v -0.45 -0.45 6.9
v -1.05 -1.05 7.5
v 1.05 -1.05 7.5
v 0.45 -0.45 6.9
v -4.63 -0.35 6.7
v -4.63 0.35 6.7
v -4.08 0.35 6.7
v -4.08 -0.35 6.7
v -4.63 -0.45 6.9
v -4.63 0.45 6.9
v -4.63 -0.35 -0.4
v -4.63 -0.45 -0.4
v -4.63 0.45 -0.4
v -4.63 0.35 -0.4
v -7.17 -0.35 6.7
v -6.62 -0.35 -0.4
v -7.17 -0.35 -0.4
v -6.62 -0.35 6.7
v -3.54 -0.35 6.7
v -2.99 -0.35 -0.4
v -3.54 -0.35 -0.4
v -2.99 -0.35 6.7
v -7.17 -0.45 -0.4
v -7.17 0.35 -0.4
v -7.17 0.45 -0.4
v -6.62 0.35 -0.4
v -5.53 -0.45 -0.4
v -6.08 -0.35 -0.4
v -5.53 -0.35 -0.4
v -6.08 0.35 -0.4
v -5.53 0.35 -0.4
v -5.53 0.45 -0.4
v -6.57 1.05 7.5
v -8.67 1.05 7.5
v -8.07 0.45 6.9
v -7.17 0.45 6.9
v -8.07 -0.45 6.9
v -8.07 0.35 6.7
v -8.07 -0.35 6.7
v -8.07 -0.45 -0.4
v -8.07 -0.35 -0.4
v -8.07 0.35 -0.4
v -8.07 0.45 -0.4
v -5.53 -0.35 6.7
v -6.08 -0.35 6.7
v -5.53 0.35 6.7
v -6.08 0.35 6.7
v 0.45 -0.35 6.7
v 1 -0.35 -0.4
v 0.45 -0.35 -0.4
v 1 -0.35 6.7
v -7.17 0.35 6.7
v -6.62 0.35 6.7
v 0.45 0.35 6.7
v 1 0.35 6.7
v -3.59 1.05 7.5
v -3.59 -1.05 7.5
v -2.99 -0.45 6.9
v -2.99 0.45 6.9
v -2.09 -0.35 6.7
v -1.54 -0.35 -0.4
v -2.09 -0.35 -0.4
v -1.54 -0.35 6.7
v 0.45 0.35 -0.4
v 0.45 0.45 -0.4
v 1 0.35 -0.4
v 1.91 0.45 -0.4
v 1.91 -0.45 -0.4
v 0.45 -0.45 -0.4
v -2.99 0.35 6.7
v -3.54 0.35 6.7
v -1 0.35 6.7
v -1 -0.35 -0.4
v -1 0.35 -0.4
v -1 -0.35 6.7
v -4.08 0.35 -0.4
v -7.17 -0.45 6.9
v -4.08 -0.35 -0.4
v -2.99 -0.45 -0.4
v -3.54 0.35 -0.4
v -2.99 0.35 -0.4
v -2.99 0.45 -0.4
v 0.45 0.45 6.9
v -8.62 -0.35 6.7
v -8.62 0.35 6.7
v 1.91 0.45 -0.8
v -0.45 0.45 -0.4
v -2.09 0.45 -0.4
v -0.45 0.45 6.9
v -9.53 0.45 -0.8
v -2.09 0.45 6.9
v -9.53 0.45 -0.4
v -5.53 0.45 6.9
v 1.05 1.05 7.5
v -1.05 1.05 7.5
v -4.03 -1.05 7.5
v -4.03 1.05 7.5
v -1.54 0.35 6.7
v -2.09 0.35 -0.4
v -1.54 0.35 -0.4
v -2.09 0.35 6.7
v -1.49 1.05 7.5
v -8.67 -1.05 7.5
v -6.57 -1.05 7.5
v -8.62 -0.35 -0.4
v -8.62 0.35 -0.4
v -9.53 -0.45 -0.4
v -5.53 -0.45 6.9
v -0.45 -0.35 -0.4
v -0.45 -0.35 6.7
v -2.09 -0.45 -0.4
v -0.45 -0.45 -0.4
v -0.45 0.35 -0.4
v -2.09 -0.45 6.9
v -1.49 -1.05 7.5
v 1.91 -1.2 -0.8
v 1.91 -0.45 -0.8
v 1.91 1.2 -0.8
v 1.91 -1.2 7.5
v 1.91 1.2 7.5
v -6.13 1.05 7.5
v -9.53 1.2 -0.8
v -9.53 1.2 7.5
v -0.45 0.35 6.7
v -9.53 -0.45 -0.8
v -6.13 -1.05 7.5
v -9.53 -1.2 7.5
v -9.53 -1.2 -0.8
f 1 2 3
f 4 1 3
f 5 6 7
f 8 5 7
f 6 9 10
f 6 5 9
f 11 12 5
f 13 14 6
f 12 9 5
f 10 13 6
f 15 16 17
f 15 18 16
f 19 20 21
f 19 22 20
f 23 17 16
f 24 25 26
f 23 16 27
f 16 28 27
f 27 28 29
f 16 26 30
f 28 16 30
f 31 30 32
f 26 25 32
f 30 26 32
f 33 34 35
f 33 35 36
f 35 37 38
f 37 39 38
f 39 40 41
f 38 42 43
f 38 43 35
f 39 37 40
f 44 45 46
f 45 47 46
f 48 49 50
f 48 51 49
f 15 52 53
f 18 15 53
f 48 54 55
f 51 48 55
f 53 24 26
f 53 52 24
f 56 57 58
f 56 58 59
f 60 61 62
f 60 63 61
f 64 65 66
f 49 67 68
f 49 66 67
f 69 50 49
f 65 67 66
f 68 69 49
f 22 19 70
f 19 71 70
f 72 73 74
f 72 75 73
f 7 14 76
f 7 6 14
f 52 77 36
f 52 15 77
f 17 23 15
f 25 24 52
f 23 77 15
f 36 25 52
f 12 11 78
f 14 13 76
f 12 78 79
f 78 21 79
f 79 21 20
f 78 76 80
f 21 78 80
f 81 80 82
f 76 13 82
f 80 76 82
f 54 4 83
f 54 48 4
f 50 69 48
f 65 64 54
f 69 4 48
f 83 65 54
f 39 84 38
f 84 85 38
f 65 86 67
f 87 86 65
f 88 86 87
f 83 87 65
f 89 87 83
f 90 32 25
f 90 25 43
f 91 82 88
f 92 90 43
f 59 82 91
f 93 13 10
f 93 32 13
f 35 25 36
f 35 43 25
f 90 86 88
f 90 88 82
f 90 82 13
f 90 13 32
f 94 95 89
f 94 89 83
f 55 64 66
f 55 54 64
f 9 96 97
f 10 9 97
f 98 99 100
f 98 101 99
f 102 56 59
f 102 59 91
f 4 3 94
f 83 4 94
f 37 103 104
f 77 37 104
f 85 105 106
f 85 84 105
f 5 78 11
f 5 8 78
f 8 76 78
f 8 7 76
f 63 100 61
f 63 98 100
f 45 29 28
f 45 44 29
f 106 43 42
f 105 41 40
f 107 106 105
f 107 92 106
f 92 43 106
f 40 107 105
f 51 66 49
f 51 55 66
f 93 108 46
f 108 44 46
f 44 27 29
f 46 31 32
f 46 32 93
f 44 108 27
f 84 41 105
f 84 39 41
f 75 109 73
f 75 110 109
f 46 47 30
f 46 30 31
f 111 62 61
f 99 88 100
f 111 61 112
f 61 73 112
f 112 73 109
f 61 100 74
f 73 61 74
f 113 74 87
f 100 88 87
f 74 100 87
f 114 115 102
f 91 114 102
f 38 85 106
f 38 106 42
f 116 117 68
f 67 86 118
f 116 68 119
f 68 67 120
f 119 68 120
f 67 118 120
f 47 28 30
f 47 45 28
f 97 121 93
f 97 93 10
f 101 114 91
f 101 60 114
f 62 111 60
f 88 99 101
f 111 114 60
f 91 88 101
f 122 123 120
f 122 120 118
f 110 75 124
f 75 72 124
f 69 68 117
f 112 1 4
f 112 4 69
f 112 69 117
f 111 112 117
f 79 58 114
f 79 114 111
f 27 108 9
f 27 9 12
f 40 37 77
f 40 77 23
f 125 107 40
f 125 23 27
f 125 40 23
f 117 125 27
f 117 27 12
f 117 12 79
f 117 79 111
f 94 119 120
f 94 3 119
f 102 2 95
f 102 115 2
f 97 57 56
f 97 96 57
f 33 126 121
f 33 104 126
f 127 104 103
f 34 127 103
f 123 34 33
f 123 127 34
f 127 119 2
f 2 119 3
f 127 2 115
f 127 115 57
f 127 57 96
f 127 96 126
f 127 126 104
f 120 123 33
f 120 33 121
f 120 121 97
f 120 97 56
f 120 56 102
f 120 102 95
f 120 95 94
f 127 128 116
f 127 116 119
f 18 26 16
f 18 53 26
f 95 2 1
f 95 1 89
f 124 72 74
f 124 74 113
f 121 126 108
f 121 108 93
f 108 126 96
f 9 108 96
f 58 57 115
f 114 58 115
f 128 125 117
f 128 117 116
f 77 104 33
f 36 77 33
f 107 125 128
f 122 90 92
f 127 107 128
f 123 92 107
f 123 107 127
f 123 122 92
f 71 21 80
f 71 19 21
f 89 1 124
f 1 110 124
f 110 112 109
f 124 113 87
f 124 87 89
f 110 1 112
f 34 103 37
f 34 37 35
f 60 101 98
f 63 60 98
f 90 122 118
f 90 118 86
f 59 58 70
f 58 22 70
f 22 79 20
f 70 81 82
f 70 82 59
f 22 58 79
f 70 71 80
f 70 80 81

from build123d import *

# Parameters (mm, degrees)
SKETCH_218_W              = 2.54
SKETCH_218_H              = 2.4
EXTRUDE_695_DEPTH         = 6.7
EXTRUDE_695_DEPTH_BACK    = 0.4
SKETCH_749_W              = 2.54
SKETCH_749_H              = 0.75
EXTRUDE_1128_DEPTH        = 0.4
SKETCH_1182_W             = 2.54
SKETCH_1182_H             = 2.4
SKETCH_1182_W_2           = 0.9
SKETCH_1182_H_2           = 0.9
EXTRUDE_1467_DEPTH        = 0.8
CHAMFER_1528_SIZE         = 0.6
PATTERN_LINEAR_1654_COUNT = 4
PATTERN_LINEAR_1654_PITCH = 2.54
EXTRUDE_1_DEPTH           = 0.64
EXTRUDE_START             = -10.8
EXTRUDE_2_DEPTH           = 0.64


with BuildPart() as part:
    # Sketch 218 → Extrude 695 (new body, two sides)
    with BuildSketch(Plane.XY) as extrude_695_sk:
        Rectangle(SKETCH_218_W, SKETCH_218_H)
        Polygon((-1, 0.35), (-0.45, 0.35), (-0.45, 0.45), (0.45, 0.45), (0.45, 0.35), (1, 0.35), (1, -0.35), (0.45, -0.35), (0.45, -0.45), (-0.45, -0.45), (-0.45, -0.35), (-1, -0.35), align=None, mode=Mode.SUBTRACT)
    extrude(amount=EXTRUDE_695_DEPTH)
    extrude(extrude_695_sk.sketch, amount=-EXTRUDE_695_DEPTH_BACK)

    # Sketch 749 → Extrude 1128 (add)
    with BuildSketch(Plane(origin=(0, 0, -0.4), x_dir=(-1, 0, 0), z_dir=(0, 0, -1))):
        with Locations((0, -0.825)):
            Rectangle(SKETCH_749_W, SKETCH_749_H)
        with Locations((0, 0.825)):
            Rectangle(SKETCH_749_W, SKETCH_749_H)
    extrude(amount=EXTRUDE_1128_DEPTH)

    # Sketch 1182 → Extrude 1467 (add)
    with BuildSketch(Plane.XY.offset(6.7)):
        Rectangle(SKETCH_1182_W, SKETCH_1182_H)
        Rectangle(SKETCH_1182_W_2, SKETCH_1182_H_2, mode=Mode.SUBTRACT)
    extrude(amount=EXTRUDE_1467_DEPTH)

    # Chamfer 1528
    chamfer_1528_edges = [part.edges().sort_by_distance(p)[0] for p in [
        (0.45, 0, 7.5),
        (0, 0.45, 7.5),
        (-0.45, 0, 7.5),
        (0, -0.45, 7.5),
    ]]
    chamfer(chamfer_1528_edges, length=CHAMFER_1528_SIZE)


with BuildPart() as pattern_linear_1654_1:
    # Pattern Linear 1654: pattern copy
    add(part.part.moved(Location(Vector(-1, 0, 0) * (1 * PATTERN_LINEAR_1654_PITCH))))


with BuildPart() as pattern_linear_1654_2:
    # Pattern Linear 1654: pattern copy
    add(part.part.moved(Location(Vector(-1, 0, 0) * (2 * PATTERN_LINEAR_1654_PITCH))))


with BuildPart() as pattern_linear_1654_3:
    # Pattern Linear 1654: pattern copy
    add(part.part.moved(Location(Vector(-1, 0, 0) * (3 * PATTERN_LINEAR_1654_PITCH))))


with BuildPart() as part_1:
    add(part.part)

    # Combine 1770: union Pattern Linear 1654_3, Pattern Linear 1654_2, Pattern Linear 1654_1
    add(pattern_linear_1654_3.part)
    add(pattern_linear_1654_2.part)
    add(pattern_linear_1654_1.part)

    # Sketch 2578 → Бобышка-БоковаяНакладка1 (add)
    with BuildSketch(Plane(origin=(1.27, 0, 0), x_dir=(0, 0, -1), z_dir=(1, 0, 0))):
        Polygon((0.8, 1.2), (0.8, 0.45), (0.4, 0.45), (0.4, -0.45), (0.8, -0.45), (0.8, -1.2), (-7.5, -1.2), (-7.5, 1.2), align=None)
    extrude(amount=EXTRUDE_1_DEPTH)

    # Эскиз-БоковаяНакладка<2> → Бобышка-БоковаяНакладка2 (add)
    with BuildSketch(Plane(origin=(1.27, 0, 0), x_dir=(0, 0, -1), z_dir=(1, 0, 0)).offset(EXTRUDE_START)):
        Polygon((0.8, 1.2), (0.8, 0.45), (0.4, 0.45), (0.4, -0.45), (0.8, -0.45), (0.8, -1.2), (-7.5, -1.2), (-7.5, 1.2), align=None)
    extrude(amount=EXTRUDE_2_DEPTH)


solid = part_1.part
